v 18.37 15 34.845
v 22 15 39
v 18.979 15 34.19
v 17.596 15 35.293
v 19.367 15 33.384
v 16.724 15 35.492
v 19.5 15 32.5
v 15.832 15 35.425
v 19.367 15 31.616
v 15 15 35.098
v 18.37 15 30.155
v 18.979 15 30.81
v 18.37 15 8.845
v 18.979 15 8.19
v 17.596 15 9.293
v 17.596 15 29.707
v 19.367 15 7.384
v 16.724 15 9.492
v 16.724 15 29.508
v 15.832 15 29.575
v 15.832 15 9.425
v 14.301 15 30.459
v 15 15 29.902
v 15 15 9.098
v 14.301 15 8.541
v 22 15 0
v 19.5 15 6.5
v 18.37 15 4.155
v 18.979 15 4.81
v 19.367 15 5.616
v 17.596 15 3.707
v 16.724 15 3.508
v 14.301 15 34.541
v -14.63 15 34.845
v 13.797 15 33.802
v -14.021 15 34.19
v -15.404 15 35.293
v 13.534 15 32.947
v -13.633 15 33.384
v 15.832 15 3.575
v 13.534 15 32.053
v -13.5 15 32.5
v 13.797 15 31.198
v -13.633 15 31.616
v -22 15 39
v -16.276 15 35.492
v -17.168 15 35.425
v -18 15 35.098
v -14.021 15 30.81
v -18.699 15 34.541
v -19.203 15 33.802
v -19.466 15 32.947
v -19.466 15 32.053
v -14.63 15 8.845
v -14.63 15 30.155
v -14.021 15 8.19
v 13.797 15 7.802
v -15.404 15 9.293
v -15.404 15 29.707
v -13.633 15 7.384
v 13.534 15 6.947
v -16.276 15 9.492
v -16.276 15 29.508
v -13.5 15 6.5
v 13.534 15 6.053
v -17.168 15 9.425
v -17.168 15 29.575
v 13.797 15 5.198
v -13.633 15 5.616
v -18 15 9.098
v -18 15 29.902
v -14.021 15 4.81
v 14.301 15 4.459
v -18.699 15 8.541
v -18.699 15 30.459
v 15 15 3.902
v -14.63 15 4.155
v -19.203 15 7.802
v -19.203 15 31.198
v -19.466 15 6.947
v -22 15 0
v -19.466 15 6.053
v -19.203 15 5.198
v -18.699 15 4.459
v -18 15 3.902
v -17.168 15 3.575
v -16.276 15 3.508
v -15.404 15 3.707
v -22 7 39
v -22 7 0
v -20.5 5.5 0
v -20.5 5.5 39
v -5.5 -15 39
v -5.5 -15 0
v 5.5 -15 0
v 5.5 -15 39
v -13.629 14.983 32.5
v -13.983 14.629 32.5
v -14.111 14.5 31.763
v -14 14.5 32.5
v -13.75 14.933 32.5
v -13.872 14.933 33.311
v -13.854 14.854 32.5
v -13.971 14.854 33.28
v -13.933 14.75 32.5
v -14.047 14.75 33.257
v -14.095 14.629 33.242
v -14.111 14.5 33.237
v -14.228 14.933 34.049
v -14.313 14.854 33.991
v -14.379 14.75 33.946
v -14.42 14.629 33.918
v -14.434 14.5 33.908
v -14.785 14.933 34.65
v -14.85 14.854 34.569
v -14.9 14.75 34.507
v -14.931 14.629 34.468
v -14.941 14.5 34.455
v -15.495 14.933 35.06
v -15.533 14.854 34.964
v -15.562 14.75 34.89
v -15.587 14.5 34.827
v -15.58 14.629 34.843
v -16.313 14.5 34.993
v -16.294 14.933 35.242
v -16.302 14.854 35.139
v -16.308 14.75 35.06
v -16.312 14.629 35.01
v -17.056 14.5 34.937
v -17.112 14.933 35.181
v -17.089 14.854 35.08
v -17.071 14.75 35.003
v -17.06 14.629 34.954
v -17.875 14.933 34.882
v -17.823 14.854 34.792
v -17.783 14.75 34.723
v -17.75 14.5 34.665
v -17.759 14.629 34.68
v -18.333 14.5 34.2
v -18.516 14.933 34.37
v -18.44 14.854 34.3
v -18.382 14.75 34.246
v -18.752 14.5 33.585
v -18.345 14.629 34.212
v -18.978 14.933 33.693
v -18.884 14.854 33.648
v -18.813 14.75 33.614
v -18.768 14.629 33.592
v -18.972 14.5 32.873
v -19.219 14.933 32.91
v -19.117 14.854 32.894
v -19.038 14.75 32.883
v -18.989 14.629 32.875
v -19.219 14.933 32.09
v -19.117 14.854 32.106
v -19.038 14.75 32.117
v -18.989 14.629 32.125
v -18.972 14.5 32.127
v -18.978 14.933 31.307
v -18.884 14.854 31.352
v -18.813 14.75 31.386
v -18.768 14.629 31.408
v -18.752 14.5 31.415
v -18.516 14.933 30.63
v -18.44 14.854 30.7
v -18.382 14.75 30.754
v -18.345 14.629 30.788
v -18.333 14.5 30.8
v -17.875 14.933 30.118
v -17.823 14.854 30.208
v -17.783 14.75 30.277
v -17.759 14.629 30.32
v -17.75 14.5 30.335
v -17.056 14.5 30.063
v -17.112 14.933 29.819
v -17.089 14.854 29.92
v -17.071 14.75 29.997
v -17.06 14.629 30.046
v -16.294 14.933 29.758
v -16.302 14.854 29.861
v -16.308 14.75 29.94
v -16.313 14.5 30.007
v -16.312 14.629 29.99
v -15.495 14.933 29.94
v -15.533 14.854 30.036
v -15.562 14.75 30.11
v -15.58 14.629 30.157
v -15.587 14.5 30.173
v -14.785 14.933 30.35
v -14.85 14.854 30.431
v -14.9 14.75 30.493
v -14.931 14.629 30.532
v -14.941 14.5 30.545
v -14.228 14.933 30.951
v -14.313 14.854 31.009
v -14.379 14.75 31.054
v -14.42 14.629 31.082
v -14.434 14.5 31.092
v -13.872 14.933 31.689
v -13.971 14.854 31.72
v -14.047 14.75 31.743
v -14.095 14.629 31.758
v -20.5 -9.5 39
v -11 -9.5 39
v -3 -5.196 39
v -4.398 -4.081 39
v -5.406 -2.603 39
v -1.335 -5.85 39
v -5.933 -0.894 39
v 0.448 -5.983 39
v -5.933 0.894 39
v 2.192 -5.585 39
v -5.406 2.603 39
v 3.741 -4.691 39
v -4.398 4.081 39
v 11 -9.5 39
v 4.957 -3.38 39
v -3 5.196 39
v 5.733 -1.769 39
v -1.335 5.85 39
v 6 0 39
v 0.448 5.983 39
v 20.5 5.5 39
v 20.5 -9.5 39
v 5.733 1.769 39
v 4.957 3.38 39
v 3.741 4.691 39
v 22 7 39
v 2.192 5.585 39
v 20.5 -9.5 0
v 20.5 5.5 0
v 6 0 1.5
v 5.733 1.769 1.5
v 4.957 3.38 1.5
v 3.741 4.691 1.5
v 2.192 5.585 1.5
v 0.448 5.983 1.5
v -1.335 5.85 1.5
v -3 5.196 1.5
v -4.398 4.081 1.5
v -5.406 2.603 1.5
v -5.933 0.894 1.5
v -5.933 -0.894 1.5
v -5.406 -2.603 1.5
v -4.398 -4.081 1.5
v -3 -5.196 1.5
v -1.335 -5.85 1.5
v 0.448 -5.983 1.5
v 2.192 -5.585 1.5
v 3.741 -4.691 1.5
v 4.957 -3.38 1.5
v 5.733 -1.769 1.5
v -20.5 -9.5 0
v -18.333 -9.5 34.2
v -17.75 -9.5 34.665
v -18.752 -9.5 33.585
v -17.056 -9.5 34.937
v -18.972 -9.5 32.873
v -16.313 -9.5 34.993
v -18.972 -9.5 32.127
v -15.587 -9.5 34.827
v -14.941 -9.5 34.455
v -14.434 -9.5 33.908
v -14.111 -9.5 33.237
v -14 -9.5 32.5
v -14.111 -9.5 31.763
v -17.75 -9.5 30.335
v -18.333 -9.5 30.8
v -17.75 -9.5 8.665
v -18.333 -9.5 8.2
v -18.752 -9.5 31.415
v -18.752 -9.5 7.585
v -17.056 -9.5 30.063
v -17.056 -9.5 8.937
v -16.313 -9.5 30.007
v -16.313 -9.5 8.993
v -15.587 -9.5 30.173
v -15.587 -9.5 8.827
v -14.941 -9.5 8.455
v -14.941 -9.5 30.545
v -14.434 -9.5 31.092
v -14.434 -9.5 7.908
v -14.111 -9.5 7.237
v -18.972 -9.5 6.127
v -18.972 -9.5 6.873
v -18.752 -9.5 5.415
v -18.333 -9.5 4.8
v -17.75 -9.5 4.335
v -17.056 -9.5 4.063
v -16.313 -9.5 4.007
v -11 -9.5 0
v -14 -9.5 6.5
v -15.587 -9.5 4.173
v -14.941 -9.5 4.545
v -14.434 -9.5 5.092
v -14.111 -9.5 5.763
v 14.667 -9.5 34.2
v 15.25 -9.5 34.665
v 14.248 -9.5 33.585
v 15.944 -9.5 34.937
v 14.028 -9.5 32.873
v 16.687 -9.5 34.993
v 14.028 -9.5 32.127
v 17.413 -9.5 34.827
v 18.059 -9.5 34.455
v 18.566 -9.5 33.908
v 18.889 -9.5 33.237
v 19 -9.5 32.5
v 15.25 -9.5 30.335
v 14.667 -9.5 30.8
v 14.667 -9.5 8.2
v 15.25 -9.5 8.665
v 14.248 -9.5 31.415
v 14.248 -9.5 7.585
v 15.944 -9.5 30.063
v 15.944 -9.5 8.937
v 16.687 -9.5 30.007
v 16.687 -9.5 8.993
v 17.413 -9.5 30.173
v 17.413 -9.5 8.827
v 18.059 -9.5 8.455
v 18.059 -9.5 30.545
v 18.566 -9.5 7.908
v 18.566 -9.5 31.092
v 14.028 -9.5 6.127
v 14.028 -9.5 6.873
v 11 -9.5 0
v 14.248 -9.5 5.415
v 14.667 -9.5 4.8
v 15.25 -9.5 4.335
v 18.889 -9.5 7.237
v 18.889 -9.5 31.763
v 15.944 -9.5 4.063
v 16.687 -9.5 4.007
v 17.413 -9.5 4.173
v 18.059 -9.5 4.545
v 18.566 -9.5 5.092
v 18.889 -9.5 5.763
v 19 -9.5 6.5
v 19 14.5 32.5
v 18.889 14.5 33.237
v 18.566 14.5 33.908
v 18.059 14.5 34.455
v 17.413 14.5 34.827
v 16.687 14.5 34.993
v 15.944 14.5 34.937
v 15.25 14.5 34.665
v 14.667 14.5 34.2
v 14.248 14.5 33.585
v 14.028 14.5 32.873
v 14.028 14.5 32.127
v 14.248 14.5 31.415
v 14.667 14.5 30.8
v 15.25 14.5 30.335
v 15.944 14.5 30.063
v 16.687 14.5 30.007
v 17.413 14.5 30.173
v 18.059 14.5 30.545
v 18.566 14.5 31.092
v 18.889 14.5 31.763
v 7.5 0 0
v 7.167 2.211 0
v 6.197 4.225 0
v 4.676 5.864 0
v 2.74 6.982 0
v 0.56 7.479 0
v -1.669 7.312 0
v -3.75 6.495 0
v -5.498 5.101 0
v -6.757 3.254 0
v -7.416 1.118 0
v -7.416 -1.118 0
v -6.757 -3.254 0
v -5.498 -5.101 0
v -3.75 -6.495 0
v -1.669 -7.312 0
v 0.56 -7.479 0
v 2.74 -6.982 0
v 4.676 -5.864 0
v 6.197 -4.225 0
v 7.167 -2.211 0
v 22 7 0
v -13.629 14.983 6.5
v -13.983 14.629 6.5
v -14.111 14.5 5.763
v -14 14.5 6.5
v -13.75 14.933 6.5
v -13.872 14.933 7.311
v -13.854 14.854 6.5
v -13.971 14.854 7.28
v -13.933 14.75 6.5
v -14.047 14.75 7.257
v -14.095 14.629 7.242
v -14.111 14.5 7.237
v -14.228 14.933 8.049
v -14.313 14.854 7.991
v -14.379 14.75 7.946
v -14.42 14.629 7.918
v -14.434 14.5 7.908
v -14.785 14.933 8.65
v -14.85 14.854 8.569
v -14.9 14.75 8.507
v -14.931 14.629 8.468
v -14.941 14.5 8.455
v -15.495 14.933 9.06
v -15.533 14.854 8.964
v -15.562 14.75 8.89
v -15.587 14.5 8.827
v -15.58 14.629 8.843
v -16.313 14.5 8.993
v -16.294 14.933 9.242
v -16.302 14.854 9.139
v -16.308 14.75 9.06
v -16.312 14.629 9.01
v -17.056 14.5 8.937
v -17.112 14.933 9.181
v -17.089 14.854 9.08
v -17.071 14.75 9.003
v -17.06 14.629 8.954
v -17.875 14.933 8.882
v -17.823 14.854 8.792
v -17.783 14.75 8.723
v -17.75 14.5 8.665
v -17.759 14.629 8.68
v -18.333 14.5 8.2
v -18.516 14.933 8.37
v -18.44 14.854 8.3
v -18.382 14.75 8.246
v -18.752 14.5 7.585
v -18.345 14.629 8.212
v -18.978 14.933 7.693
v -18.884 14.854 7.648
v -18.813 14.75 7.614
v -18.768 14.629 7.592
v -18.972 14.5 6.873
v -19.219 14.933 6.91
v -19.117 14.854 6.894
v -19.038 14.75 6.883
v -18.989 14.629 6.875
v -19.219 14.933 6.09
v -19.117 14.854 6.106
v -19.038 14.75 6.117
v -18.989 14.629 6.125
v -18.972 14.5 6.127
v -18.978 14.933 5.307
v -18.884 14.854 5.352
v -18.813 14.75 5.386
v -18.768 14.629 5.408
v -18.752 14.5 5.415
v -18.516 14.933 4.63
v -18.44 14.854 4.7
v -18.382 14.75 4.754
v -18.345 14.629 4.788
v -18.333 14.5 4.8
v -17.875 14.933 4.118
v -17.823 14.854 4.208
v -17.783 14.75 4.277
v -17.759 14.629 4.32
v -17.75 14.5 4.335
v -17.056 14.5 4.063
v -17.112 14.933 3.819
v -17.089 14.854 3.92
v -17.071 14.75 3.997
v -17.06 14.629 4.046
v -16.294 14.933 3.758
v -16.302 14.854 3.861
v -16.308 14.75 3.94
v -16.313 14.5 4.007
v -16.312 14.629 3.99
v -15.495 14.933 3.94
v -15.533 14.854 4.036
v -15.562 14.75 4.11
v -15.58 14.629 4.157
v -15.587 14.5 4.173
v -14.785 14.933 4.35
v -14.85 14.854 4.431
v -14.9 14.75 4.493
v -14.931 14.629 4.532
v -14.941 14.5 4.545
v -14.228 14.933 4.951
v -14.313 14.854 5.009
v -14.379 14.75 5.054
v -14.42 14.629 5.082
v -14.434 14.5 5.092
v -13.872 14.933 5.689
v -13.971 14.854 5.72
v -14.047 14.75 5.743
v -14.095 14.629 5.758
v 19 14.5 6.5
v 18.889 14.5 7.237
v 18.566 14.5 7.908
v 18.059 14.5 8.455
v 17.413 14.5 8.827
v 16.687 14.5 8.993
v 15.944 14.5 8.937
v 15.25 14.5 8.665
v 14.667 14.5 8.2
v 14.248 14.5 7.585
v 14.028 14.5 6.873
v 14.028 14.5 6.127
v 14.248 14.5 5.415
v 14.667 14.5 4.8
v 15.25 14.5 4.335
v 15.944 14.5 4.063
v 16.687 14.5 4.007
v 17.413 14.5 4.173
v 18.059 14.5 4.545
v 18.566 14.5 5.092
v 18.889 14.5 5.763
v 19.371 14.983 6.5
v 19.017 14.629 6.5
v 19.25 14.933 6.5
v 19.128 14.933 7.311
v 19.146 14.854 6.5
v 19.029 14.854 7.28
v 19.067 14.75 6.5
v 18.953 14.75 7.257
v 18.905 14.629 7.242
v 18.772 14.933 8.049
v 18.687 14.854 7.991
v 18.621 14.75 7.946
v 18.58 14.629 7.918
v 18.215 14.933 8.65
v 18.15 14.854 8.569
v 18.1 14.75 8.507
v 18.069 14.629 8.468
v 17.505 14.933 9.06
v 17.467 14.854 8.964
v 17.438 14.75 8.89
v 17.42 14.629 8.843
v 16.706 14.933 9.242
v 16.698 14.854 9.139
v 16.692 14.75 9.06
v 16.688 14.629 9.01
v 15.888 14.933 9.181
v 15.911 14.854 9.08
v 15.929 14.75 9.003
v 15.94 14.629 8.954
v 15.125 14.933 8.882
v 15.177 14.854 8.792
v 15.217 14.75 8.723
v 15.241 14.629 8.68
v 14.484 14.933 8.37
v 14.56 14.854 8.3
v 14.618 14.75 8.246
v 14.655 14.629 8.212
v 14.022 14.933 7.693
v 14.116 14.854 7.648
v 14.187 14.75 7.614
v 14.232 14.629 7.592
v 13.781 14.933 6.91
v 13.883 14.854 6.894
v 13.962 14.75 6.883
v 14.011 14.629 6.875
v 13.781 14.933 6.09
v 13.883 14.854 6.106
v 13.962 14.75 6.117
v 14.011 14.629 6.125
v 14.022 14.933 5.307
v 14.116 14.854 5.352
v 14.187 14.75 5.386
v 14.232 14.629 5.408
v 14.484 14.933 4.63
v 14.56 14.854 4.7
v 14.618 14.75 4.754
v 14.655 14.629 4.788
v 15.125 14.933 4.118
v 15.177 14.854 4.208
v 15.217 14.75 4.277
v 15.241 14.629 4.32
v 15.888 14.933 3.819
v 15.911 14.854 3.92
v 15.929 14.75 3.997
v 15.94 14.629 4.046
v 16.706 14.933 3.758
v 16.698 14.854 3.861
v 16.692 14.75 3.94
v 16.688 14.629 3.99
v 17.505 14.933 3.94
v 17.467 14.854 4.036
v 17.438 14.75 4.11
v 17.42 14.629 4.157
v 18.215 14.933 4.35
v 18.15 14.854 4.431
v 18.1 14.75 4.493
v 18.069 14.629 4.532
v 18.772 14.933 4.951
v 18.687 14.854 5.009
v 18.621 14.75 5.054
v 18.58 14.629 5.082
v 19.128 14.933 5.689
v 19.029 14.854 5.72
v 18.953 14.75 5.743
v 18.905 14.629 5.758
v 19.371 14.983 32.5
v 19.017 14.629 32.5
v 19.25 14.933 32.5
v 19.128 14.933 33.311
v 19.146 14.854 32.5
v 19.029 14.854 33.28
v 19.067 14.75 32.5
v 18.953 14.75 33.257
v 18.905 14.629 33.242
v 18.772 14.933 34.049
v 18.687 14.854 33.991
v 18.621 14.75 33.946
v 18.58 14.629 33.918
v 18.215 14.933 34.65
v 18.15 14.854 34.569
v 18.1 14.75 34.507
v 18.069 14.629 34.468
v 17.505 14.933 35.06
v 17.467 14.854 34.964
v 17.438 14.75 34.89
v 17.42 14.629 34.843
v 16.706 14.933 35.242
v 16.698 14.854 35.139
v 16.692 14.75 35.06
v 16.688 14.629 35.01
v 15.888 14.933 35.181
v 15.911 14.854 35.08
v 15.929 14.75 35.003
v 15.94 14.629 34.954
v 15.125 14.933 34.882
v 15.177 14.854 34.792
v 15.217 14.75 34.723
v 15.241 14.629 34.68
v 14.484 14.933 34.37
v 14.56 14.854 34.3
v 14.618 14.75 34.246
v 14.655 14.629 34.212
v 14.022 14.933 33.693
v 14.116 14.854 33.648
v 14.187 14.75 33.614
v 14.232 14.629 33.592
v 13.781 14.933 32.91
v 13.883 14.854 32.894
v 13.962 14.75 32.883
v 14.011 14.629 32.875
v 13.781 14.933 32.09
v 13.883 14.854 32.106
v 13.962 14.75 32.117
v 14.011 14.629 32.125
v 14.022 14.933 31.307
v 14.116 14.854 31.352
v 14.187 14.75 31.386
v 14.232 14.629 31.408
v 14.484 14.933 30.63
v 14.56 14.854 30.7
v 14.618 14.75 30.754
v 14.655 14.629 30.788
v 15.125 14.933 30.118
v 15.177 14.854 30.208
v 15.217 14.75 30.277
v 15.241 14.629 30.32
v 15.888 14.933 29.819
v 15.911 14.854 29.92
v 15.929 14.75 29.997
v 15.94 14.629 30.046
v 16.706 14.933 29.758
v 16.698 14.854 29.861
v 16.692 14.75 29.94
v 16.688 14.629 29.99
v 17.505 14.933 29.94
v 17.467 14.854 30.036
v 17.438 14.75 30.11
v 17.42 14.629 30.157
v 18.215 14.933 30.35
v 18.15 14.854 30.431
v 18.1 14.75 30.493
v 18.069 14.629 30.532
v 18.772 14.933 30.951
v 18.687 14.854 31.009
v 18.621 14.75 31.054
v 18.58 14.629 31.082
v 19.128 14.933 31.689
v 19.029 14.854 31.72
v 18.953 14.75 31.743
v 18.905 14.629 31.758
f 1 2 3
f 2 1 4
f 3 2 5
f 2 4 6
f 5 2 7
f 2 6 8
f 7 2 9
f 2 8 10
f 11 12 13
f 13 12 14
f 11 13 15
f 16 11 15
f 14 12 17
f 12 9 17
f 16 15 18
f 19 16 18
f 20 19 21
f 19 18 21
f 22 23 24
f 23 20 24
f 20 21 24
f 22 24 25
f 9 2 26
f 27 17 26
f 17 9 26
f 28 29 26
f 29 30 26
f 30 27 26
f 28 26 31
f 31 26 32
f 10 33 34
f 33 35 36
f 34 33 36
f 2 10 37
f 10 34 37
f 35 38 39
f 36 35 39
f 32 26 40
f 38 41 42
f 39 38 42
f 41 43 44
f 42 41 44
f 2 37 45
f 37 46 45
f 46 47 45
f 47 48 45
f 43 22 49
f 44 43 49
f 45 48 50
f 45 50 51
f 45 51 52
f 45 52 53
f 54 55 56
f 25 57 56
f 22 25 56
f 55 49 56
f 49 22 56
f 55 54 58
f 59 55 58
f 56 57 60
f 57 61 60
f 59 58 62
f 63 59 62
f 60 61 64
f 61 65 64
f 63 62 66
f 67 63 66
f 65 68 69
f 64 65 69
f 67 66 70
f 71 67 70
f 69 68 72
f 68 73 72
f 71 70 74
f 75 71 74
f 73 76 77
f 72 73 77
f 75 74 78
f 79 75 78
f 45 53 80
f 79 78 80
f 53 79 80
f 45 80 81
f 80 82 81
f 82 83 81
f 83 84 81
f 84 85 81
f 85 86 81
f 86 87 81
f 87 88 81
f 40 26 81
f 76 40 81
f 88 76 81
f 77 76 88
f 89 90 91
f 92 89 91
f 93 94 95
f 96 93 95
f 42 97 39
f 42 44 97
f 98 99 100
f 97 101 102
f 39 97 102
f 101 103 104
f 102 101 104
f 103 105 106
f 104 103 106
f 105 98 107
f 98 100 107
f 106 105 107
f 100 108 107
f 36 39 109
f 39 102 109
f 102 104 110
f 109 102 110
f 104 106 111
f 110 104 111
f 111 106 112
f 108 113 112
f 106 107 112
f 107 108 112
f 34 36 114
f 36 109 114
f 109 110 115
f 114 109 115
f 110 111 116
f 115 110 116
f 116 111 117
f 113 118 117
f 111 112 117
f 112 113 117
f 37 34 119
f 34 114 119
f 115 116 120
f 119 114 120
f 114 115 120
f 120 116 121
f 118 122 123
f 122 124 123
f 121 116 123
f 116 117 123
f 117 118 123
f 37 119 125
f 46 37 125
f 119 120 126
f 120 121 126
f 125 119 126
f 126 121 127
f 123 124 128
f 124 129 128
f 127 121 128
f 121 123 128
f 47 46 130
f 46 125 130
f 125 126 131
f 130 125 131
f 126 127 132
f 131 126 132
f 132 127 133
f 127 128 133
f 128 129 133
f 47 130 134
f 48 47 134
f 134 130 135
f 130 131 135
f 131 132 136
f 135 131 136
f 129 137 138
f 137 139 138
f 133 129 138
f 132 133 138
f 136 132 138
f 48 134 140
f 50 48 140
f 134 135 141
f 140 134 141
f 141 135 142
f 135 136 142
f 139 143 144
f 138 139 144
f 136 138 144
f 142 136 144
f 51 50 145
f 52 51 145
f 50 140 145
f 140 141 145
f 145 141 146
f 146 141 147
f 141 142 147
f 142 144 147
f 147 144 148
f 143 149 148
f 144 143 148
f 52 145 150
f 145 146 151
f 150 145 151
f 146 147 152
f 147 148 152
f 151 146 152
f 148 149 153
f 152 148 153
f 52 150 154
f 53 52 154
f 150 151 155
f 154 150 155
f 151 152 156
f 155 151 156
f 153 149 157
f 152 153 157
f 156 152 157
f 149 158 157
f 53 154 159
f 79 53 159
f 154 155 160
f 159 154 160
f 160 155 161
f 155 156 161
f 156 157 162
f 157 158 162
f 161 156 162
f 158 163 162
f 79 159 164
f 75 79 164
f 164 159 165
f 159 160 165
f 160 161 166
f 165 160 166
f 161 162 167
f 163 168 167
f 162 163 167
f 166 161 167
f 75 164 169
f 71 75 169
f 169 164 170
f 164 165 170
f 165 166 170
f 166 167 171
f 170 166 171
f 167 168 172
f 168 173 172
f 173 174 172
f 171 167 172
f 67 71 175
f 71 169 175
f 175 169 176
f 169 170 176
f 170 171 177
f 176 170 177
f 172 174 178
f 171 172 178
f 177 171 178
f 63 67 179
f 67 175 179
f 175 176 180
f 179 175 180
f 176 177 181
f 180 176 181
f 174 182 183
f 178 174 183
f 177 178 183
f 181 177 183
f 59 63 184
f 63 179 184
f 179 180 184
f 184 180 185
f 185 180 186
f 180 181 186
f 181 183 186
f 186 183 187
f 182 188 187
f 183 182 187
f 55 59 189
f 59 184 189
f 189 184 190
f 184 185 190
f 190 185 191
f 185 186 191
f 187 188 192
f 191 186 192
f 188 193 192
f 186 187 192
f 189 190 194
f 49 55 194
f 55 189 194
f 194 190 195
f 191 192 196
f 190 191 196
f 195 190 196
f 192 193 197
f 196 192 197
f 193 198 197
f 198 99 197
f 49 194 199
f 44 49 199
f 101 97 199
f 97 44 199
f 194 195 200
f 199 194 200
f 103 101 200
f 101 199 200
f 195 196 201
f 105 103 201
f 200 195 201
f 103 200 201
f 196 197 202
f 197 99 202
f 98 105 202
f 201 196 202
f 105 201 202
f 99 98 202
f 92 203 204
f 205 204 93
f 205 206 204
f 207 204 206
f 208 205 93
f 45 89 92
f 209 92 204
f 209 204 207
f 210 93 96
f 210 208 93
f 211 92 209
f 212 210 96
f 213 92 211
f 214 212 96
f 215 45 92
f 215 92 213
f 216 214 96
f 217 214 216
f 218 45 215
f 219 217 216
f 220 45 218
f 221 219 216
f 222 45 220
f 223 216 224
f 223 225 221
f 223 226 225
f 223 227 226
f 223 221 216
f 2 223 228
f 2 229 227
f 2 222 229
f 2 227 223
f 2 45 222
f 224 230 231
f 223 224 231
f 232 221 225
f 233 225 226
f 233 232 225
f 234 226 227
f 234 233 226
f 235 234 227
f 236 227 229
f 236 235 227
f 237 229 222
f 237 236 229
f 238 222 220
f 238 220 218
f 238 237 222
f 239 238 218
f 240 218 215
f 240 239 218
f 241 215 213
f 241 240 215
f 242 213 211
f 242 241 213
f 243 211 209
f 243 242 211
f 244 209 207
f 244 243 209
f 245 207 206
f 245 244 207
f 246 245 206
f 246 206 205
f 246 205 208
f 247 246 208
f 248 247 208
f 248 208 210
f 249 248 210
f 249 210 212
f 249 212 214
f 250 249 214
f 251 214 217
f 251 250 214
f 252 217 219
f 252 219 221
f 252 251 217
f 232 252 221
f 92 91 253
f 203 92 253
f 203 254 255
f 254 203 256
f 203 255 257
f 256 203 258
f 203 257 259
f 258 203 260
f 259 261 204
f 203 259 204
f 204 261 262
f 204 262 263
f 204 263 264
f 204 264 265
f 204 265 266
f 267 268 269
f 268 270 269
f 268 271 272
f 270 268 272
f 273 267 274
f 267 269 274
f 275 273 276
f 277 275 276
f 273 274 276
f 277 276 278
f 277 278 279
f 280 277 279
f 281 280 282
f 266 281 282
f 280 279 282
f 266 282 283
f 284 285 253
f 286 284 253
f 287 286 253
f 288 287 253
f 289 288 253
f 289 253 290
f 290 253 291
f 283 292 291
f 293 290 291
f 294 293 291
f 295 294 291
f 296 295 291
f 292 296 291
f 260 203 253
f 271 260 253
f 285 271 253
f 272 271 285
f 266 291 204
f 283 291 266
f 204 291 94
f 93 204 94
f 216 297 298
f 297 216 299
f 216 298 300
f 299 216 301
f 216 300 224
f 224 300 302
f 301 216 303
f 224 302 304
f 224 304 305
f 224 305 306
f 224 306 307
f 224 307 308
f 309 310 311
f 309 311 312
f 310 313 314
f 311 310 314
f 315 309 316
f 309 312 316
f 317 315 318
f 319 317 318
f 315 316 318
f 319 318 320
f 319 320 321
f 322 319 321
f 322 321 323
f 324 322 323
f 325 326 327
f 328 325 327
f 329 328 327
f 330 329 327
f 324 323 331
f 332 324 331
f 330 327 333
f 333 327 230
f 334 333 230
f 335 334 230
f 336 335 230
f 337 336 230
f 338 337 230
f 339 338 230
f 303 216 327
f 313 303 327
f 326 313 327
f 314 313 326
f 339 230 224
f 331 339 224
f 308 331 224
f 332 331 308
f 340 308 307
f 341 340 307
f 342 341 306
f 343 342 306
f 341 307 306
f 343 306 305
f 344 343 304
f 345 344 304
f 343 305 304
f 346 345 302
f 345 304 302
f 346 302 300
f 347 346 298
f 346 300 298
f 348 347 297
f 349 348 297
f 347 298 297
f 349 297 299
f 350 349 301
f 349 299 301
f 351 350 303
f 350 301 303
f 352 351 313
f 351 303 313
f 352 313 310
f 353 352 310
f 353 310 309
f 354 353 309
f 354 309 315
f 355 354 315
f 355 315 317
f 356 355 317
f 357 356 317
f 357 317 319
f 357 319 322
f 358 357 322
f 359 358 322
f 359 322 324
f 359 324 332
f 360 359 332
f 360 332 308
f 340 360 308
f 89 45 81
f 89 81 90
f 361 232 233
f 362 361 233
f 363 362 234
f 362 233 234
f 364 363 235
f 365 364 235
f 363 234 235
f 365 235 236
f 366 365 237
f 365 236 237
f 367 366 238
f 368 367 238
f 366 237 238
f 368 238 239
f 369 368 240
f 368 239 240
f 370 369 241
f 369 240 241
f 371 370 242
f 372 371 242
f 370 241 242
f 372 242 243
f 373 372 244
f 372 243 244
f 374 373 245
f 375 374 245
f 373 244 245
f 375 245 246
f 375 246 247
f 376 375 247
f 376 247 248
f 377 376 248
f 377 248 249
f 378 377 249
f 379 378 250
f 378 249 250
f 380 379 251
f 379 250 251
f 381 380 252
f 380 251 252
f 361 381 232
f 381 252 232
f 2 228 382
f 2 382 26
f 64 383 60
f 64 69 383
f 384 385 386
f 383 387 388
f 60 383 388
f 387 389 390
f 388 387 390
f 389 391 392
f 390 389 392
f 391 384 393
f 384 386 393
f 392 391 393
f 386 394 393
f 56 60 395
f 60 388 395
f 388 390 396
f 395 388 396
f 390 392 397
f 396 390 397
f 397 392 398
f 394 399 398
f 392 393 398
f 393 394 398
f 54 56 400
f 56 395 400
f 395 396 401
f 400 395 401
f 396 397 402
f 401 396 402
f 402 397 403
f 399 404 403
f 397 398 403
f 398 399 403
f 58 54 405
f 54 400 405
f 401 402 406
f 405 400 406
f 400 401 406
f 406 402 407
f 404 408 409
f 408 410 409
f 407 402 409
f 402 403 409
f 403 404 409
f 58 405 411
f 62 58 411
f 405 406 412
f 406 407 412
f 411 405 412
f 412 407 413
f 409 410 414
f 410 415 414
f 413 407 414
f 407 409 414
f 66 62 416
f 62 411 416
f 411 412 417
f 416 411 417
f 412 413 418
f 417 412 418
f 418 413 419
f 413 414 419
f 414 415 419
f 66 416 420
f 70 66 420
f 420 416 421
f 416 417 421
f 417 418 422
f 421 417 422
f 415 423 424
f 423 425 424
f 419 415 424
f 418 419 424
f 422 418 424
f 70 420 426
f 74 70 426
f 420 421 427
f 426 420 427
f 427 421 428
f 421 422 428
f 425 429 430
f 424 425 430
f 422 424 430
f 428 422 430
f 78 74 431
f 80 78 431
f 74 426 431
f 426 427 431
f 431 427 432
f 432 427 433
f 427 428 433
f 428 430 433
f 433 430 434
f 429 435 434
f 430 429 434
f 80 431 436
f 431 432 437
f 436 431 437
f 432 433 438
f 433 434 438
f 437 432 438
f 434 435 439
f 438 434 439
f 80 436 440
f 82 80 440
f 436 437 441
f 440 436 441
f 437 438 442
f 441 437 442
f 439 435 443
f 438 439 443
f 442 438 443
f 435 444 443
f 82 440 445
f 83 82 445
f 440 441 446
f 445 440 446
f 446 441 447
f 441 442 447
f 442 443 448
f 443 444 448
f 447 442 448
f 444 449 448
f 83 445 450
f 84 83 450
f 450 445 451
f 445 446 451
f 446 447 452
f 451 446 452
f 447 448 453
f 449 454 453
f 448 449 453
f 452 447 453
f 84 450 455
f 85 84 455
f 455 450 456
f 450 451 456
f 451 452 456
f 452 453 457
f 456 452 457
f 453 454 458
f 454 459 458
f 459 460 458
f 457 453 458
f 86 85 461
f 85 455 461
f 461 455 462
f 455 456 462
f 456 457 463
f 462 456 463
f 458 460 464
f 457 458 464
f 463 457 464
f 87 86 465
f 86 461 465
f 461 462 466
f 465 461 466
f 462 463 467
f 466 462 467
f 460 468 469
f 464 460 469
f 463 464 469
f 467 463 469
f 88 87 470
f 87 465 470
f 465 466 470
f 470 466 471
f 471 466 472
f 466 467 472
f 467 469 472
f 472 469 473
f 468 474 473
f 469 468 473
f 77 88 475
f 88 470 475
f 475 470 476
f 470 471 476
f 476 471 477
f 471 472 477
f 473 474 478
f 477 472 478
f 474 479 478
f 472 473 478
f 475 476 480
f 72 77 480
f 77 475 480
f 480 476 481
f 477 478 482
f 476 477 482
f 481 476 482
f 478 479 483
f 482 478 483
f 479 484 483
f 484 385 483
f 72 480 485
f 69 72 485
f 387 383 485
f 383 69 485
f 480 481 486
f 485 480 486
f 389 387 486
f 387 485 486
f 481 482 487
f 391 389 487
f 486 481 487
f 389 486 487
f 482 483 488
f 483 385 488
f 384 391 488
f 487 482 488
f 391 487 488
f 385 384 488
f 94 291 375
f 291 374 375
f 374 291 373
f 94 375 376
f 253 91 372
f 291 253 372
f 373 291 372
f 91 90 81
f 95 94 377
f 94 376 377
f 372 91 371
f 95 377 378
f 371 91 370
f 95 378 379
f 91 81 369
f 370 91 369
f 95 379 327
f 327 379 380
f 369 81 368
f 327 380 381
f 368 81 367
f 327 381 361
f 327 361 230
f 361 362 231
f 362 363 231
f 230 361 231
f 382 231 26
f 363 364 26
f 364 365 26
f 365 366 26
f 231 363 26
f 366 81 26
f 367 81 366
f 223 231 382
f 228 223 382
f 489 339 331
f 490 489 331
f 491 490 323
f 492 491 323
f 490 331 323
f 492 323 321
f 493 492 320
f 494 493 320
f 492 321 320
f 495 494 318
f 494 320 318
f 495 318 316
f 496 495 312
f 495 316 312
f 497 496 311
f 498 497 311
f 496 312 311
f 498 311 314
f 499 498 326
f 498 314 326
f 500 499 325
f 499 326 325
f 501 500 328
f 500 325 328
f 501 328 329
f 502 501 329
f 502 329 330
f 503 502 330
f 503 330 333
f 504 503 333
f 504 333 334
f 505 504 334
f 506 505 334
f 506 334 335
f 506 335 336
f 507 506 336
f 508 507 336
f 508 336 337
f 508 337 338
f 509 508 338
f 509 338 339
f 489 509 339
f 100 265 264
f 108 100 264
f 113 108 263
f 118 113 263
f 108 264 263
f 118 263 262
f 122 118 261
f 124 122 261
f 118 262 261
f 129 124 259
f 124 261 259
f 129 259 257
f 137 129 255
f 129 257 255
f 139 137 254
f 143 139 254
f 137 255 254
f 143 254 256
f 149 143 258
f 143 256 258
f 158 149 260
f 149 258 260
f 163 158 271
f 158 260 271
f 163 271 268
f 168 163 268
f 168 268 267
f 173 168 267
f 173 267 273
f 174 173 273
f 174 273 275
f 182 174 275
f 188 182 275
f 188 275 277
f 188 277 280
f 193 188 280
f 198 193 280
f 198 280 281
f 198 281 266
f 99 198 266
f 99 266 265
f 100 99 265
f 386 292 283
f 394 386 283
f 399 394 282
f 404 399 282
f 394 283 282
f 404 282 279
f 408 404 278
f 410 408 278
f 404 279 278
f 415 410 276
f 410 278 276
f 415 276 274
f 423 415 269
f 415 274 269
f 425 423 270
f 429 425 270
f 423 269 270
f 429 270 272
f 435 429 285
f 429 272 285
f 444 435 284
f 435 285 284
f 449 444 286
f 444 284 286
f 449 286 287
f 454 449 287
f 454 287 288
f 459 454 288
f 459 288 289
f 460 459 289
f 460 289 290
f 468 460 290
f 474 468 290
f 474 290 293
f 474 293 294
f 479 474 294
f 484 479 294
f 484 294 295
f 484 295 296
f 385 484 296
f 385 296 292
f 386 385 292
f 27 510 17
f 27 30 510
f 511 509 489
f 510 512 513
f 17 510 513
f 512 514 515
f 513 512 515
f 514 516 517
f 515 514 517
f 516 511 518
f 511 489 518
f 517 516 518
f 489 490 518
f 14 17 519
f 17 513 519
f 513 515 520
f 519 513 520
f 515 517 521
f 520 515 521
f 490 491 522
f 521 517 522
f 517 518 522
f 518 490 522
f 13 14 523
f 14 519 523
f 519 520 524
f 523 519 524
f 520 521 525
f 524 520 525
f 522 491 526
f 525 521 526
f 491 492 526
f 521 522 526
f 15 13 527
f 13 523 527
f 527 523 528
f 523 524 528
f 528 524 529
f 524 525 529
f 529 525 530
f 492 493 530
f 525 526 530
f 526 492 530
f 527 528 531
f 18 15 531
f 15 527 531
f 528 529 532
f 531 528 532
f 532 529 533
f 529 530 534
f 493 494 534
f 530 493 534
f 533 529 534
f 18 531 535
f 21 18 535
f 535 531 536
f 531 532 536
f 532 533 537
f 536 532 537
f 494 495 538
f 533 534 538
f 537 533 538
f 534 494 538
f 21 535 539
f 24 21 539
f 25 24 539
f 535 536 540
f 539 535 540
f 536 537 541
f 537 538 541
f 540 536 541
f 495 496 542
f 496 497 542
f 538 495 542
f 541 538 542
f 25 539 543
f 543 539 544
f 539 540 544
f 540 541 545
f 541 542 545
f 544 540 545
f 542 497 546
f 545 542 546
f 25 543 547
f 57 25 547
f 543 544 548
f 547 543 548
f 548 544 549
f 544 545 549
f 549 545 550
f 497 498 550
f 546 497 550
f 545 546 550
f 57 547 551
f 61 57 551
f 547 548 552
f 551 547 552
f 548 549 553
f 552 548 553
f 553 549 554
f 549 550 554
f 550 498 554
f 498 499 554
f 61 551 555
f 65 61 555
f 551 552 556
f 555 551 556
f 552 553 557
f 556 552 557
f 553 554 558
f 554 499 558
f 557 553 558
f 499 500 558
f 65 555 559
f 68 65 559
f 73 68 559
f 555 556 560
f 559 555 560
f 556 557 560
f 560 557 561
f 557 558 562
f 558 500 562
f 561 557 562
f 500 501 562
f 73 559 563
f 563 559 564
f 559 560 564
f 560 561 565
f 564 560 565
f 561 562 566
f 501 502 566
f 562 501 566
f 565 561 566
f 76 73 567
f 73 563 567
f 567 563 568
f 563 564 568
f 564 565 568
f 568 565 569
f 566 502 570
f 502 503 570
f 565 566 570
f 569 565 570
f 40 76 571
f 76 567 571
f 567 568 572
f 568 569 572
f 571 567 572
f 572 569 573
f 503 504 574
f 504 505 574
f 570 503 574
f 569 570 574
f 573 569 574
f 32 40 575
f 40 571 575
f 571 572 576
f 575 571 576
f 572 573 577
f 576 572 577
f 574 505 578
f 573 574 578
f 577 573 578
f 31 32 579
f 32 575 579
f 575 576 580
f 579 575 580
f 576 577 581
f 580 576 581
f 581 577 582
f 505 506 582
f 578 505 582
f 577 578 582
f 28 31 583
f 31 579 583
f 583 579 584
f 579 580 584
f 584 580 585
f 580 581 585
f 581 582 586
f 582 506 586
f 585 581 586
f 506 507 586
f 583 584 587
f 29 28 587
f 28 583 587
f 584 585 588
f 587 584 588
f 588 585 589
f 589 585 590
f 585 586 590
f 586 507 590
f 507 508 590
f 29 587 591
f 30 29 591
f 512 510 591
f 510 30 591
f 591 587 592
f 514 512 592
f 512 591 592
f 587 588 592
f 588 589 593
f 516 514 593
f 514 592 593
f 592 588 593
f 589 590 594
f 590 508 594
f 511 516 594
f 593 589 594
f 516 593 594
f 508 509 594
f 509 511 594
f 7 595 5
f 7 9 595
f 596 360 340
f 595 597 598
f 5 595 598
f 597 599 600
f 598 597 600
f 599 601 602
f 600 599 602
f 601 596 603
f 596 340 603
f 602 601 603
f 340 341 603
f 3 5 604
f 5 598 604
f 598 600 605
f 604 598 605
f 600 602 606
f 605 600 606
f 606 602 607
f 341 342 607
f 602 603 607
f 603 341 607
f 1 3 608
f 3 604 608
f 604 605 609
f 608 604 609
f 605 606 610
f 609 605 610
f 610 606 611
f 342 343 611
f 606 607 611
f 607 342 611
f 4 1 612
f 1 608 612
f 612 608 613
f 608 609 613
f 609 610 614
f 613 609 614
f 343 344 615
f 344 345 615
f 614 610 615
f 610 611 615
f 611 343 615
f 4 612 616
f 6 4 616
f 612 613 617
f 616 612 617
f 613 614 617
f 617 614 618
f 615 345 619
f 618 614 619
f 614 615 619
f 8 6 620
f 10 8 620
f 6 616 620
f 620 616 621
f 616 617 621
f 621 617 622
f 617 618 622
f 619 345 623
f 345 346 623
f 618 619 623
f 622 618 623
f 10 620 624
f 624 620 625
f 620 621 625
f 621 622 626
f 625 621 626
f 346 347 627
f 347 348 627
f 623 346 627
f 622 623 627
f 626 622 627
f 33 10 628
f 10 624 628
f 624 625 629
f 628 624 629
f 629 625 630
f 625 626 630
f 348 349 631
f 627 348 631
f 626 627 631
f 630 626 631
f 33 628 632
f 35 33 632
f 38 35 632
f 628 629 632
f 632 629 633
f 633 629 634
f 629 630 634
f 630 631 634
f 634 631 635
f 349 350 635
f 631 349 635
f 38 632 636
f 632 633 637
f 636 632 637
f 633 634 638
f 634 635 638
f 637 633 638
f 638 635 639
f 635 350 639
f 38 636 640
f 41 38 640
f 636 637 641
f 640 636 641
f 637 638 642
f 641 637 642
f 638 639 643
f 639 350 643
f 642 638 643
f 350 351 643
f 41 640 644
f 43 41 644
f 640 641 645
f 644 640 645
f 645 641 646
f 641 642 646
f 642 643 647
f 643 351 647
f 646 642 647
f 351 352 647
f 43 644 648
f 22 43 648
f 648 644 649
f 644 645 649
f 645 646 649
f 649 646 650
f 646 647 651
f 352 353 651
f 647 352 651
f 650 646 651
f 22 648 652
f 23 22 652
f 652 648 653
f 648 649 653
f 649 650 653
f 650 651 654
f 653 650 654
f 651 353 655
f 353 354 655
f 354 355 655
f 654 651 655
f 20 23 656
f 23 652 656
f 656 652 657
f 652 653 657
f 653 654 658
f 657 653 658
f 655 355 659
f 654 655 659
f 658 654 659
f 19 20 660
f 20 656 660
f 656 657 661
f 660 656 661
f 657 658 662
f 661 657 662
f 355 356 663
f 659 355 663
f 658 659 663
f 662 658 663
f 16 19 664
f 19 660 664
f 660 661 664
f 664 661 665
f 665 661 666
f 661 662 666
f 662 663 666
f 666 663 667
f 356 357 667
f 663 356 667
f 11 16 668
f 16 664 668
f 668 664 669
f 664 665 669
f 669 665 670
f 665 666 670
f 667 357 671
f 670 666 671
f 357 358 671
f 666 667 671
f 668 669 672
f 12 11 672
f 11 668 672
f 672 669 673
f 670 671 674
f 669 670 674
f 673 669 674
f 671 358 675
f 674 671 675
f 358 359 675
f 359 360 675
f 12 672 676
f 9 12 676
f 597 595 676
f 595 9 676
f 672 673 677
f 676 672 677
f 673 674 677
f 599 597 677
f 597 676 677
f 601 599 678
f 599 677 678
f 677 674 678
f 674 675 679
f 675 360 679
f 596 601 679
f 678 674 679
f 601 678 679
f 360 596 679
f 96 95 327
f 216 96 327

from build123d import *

# Parameters (mm, degrees)
IZIM2_R                     = 6
Y_KSEKLIK_EKSTR_ZYON1_DEPTH = 39
IZIM3_R                     = 2.5
KES_EKSTR_ZYON1_DEPTH       = 39
PAH2_SIZE                   = 1.5
FILLET2_R                   = 0.5


with BuildPart() as part:
    # Çizim2 → Yükseklik-Ekstrüzyon1 (new body)
    with BuildSketch(Plane.XY):
        Polygon((22, 15), (-22, 15), (-22, 7), (-20.5, 5.5), (-20.5, -9.5), (-11, -9.5), (-5.5, -15), (5.5, -15), (11, -9.5), (20.5, -9.5), (20.5, 5.5), (22, 7), align=None)
        Circle(IZIM2_R, mode=Mode.SUBTRACT)
    extrude(amount=Y_KSEKLIK_EKSTR_ZYON1_DEPTH)

    # Çizim3 → Kes-Ekstrüzyon1 (cut)
    with BuildSketch(Plane.XZ.offset(9.5)):
        with Locations((16.5, 32.5)):
            Circle(IZIM3_R)
        with Locations((-16.5, 32.5)):
            Circle(IZIM3_R)
        with Locations((-16.5, 6.5)):
            Circle(IZIM3_R)
        with Locations((16.5, 6.5)):
            Circle(IZIM3_R)
    extrude(amount=-KES_EKSTR_ZYON1_DEPTH, mode=Mode.SUBTRACT)

    # Pah2
    pah2_edges = [part.edges().sort_by_distance(p)[0] for p in [
        (-6, 0, 0),
    ]]
    chamfer(pah2_edges, length=PAH2_SIZE)

    # Fillet2
    fillet2_edges = [part.edges().sort_by_distance(p)[0] for p in [
        (14, 15, 32.5),
        (14, 15, 6.5),
        (-19, 15, 6.5),
        (-19, 15, 32.5),
    ]]
    fillet(fillet2_edges, radius=FILLET2_R)


solid = part.part
